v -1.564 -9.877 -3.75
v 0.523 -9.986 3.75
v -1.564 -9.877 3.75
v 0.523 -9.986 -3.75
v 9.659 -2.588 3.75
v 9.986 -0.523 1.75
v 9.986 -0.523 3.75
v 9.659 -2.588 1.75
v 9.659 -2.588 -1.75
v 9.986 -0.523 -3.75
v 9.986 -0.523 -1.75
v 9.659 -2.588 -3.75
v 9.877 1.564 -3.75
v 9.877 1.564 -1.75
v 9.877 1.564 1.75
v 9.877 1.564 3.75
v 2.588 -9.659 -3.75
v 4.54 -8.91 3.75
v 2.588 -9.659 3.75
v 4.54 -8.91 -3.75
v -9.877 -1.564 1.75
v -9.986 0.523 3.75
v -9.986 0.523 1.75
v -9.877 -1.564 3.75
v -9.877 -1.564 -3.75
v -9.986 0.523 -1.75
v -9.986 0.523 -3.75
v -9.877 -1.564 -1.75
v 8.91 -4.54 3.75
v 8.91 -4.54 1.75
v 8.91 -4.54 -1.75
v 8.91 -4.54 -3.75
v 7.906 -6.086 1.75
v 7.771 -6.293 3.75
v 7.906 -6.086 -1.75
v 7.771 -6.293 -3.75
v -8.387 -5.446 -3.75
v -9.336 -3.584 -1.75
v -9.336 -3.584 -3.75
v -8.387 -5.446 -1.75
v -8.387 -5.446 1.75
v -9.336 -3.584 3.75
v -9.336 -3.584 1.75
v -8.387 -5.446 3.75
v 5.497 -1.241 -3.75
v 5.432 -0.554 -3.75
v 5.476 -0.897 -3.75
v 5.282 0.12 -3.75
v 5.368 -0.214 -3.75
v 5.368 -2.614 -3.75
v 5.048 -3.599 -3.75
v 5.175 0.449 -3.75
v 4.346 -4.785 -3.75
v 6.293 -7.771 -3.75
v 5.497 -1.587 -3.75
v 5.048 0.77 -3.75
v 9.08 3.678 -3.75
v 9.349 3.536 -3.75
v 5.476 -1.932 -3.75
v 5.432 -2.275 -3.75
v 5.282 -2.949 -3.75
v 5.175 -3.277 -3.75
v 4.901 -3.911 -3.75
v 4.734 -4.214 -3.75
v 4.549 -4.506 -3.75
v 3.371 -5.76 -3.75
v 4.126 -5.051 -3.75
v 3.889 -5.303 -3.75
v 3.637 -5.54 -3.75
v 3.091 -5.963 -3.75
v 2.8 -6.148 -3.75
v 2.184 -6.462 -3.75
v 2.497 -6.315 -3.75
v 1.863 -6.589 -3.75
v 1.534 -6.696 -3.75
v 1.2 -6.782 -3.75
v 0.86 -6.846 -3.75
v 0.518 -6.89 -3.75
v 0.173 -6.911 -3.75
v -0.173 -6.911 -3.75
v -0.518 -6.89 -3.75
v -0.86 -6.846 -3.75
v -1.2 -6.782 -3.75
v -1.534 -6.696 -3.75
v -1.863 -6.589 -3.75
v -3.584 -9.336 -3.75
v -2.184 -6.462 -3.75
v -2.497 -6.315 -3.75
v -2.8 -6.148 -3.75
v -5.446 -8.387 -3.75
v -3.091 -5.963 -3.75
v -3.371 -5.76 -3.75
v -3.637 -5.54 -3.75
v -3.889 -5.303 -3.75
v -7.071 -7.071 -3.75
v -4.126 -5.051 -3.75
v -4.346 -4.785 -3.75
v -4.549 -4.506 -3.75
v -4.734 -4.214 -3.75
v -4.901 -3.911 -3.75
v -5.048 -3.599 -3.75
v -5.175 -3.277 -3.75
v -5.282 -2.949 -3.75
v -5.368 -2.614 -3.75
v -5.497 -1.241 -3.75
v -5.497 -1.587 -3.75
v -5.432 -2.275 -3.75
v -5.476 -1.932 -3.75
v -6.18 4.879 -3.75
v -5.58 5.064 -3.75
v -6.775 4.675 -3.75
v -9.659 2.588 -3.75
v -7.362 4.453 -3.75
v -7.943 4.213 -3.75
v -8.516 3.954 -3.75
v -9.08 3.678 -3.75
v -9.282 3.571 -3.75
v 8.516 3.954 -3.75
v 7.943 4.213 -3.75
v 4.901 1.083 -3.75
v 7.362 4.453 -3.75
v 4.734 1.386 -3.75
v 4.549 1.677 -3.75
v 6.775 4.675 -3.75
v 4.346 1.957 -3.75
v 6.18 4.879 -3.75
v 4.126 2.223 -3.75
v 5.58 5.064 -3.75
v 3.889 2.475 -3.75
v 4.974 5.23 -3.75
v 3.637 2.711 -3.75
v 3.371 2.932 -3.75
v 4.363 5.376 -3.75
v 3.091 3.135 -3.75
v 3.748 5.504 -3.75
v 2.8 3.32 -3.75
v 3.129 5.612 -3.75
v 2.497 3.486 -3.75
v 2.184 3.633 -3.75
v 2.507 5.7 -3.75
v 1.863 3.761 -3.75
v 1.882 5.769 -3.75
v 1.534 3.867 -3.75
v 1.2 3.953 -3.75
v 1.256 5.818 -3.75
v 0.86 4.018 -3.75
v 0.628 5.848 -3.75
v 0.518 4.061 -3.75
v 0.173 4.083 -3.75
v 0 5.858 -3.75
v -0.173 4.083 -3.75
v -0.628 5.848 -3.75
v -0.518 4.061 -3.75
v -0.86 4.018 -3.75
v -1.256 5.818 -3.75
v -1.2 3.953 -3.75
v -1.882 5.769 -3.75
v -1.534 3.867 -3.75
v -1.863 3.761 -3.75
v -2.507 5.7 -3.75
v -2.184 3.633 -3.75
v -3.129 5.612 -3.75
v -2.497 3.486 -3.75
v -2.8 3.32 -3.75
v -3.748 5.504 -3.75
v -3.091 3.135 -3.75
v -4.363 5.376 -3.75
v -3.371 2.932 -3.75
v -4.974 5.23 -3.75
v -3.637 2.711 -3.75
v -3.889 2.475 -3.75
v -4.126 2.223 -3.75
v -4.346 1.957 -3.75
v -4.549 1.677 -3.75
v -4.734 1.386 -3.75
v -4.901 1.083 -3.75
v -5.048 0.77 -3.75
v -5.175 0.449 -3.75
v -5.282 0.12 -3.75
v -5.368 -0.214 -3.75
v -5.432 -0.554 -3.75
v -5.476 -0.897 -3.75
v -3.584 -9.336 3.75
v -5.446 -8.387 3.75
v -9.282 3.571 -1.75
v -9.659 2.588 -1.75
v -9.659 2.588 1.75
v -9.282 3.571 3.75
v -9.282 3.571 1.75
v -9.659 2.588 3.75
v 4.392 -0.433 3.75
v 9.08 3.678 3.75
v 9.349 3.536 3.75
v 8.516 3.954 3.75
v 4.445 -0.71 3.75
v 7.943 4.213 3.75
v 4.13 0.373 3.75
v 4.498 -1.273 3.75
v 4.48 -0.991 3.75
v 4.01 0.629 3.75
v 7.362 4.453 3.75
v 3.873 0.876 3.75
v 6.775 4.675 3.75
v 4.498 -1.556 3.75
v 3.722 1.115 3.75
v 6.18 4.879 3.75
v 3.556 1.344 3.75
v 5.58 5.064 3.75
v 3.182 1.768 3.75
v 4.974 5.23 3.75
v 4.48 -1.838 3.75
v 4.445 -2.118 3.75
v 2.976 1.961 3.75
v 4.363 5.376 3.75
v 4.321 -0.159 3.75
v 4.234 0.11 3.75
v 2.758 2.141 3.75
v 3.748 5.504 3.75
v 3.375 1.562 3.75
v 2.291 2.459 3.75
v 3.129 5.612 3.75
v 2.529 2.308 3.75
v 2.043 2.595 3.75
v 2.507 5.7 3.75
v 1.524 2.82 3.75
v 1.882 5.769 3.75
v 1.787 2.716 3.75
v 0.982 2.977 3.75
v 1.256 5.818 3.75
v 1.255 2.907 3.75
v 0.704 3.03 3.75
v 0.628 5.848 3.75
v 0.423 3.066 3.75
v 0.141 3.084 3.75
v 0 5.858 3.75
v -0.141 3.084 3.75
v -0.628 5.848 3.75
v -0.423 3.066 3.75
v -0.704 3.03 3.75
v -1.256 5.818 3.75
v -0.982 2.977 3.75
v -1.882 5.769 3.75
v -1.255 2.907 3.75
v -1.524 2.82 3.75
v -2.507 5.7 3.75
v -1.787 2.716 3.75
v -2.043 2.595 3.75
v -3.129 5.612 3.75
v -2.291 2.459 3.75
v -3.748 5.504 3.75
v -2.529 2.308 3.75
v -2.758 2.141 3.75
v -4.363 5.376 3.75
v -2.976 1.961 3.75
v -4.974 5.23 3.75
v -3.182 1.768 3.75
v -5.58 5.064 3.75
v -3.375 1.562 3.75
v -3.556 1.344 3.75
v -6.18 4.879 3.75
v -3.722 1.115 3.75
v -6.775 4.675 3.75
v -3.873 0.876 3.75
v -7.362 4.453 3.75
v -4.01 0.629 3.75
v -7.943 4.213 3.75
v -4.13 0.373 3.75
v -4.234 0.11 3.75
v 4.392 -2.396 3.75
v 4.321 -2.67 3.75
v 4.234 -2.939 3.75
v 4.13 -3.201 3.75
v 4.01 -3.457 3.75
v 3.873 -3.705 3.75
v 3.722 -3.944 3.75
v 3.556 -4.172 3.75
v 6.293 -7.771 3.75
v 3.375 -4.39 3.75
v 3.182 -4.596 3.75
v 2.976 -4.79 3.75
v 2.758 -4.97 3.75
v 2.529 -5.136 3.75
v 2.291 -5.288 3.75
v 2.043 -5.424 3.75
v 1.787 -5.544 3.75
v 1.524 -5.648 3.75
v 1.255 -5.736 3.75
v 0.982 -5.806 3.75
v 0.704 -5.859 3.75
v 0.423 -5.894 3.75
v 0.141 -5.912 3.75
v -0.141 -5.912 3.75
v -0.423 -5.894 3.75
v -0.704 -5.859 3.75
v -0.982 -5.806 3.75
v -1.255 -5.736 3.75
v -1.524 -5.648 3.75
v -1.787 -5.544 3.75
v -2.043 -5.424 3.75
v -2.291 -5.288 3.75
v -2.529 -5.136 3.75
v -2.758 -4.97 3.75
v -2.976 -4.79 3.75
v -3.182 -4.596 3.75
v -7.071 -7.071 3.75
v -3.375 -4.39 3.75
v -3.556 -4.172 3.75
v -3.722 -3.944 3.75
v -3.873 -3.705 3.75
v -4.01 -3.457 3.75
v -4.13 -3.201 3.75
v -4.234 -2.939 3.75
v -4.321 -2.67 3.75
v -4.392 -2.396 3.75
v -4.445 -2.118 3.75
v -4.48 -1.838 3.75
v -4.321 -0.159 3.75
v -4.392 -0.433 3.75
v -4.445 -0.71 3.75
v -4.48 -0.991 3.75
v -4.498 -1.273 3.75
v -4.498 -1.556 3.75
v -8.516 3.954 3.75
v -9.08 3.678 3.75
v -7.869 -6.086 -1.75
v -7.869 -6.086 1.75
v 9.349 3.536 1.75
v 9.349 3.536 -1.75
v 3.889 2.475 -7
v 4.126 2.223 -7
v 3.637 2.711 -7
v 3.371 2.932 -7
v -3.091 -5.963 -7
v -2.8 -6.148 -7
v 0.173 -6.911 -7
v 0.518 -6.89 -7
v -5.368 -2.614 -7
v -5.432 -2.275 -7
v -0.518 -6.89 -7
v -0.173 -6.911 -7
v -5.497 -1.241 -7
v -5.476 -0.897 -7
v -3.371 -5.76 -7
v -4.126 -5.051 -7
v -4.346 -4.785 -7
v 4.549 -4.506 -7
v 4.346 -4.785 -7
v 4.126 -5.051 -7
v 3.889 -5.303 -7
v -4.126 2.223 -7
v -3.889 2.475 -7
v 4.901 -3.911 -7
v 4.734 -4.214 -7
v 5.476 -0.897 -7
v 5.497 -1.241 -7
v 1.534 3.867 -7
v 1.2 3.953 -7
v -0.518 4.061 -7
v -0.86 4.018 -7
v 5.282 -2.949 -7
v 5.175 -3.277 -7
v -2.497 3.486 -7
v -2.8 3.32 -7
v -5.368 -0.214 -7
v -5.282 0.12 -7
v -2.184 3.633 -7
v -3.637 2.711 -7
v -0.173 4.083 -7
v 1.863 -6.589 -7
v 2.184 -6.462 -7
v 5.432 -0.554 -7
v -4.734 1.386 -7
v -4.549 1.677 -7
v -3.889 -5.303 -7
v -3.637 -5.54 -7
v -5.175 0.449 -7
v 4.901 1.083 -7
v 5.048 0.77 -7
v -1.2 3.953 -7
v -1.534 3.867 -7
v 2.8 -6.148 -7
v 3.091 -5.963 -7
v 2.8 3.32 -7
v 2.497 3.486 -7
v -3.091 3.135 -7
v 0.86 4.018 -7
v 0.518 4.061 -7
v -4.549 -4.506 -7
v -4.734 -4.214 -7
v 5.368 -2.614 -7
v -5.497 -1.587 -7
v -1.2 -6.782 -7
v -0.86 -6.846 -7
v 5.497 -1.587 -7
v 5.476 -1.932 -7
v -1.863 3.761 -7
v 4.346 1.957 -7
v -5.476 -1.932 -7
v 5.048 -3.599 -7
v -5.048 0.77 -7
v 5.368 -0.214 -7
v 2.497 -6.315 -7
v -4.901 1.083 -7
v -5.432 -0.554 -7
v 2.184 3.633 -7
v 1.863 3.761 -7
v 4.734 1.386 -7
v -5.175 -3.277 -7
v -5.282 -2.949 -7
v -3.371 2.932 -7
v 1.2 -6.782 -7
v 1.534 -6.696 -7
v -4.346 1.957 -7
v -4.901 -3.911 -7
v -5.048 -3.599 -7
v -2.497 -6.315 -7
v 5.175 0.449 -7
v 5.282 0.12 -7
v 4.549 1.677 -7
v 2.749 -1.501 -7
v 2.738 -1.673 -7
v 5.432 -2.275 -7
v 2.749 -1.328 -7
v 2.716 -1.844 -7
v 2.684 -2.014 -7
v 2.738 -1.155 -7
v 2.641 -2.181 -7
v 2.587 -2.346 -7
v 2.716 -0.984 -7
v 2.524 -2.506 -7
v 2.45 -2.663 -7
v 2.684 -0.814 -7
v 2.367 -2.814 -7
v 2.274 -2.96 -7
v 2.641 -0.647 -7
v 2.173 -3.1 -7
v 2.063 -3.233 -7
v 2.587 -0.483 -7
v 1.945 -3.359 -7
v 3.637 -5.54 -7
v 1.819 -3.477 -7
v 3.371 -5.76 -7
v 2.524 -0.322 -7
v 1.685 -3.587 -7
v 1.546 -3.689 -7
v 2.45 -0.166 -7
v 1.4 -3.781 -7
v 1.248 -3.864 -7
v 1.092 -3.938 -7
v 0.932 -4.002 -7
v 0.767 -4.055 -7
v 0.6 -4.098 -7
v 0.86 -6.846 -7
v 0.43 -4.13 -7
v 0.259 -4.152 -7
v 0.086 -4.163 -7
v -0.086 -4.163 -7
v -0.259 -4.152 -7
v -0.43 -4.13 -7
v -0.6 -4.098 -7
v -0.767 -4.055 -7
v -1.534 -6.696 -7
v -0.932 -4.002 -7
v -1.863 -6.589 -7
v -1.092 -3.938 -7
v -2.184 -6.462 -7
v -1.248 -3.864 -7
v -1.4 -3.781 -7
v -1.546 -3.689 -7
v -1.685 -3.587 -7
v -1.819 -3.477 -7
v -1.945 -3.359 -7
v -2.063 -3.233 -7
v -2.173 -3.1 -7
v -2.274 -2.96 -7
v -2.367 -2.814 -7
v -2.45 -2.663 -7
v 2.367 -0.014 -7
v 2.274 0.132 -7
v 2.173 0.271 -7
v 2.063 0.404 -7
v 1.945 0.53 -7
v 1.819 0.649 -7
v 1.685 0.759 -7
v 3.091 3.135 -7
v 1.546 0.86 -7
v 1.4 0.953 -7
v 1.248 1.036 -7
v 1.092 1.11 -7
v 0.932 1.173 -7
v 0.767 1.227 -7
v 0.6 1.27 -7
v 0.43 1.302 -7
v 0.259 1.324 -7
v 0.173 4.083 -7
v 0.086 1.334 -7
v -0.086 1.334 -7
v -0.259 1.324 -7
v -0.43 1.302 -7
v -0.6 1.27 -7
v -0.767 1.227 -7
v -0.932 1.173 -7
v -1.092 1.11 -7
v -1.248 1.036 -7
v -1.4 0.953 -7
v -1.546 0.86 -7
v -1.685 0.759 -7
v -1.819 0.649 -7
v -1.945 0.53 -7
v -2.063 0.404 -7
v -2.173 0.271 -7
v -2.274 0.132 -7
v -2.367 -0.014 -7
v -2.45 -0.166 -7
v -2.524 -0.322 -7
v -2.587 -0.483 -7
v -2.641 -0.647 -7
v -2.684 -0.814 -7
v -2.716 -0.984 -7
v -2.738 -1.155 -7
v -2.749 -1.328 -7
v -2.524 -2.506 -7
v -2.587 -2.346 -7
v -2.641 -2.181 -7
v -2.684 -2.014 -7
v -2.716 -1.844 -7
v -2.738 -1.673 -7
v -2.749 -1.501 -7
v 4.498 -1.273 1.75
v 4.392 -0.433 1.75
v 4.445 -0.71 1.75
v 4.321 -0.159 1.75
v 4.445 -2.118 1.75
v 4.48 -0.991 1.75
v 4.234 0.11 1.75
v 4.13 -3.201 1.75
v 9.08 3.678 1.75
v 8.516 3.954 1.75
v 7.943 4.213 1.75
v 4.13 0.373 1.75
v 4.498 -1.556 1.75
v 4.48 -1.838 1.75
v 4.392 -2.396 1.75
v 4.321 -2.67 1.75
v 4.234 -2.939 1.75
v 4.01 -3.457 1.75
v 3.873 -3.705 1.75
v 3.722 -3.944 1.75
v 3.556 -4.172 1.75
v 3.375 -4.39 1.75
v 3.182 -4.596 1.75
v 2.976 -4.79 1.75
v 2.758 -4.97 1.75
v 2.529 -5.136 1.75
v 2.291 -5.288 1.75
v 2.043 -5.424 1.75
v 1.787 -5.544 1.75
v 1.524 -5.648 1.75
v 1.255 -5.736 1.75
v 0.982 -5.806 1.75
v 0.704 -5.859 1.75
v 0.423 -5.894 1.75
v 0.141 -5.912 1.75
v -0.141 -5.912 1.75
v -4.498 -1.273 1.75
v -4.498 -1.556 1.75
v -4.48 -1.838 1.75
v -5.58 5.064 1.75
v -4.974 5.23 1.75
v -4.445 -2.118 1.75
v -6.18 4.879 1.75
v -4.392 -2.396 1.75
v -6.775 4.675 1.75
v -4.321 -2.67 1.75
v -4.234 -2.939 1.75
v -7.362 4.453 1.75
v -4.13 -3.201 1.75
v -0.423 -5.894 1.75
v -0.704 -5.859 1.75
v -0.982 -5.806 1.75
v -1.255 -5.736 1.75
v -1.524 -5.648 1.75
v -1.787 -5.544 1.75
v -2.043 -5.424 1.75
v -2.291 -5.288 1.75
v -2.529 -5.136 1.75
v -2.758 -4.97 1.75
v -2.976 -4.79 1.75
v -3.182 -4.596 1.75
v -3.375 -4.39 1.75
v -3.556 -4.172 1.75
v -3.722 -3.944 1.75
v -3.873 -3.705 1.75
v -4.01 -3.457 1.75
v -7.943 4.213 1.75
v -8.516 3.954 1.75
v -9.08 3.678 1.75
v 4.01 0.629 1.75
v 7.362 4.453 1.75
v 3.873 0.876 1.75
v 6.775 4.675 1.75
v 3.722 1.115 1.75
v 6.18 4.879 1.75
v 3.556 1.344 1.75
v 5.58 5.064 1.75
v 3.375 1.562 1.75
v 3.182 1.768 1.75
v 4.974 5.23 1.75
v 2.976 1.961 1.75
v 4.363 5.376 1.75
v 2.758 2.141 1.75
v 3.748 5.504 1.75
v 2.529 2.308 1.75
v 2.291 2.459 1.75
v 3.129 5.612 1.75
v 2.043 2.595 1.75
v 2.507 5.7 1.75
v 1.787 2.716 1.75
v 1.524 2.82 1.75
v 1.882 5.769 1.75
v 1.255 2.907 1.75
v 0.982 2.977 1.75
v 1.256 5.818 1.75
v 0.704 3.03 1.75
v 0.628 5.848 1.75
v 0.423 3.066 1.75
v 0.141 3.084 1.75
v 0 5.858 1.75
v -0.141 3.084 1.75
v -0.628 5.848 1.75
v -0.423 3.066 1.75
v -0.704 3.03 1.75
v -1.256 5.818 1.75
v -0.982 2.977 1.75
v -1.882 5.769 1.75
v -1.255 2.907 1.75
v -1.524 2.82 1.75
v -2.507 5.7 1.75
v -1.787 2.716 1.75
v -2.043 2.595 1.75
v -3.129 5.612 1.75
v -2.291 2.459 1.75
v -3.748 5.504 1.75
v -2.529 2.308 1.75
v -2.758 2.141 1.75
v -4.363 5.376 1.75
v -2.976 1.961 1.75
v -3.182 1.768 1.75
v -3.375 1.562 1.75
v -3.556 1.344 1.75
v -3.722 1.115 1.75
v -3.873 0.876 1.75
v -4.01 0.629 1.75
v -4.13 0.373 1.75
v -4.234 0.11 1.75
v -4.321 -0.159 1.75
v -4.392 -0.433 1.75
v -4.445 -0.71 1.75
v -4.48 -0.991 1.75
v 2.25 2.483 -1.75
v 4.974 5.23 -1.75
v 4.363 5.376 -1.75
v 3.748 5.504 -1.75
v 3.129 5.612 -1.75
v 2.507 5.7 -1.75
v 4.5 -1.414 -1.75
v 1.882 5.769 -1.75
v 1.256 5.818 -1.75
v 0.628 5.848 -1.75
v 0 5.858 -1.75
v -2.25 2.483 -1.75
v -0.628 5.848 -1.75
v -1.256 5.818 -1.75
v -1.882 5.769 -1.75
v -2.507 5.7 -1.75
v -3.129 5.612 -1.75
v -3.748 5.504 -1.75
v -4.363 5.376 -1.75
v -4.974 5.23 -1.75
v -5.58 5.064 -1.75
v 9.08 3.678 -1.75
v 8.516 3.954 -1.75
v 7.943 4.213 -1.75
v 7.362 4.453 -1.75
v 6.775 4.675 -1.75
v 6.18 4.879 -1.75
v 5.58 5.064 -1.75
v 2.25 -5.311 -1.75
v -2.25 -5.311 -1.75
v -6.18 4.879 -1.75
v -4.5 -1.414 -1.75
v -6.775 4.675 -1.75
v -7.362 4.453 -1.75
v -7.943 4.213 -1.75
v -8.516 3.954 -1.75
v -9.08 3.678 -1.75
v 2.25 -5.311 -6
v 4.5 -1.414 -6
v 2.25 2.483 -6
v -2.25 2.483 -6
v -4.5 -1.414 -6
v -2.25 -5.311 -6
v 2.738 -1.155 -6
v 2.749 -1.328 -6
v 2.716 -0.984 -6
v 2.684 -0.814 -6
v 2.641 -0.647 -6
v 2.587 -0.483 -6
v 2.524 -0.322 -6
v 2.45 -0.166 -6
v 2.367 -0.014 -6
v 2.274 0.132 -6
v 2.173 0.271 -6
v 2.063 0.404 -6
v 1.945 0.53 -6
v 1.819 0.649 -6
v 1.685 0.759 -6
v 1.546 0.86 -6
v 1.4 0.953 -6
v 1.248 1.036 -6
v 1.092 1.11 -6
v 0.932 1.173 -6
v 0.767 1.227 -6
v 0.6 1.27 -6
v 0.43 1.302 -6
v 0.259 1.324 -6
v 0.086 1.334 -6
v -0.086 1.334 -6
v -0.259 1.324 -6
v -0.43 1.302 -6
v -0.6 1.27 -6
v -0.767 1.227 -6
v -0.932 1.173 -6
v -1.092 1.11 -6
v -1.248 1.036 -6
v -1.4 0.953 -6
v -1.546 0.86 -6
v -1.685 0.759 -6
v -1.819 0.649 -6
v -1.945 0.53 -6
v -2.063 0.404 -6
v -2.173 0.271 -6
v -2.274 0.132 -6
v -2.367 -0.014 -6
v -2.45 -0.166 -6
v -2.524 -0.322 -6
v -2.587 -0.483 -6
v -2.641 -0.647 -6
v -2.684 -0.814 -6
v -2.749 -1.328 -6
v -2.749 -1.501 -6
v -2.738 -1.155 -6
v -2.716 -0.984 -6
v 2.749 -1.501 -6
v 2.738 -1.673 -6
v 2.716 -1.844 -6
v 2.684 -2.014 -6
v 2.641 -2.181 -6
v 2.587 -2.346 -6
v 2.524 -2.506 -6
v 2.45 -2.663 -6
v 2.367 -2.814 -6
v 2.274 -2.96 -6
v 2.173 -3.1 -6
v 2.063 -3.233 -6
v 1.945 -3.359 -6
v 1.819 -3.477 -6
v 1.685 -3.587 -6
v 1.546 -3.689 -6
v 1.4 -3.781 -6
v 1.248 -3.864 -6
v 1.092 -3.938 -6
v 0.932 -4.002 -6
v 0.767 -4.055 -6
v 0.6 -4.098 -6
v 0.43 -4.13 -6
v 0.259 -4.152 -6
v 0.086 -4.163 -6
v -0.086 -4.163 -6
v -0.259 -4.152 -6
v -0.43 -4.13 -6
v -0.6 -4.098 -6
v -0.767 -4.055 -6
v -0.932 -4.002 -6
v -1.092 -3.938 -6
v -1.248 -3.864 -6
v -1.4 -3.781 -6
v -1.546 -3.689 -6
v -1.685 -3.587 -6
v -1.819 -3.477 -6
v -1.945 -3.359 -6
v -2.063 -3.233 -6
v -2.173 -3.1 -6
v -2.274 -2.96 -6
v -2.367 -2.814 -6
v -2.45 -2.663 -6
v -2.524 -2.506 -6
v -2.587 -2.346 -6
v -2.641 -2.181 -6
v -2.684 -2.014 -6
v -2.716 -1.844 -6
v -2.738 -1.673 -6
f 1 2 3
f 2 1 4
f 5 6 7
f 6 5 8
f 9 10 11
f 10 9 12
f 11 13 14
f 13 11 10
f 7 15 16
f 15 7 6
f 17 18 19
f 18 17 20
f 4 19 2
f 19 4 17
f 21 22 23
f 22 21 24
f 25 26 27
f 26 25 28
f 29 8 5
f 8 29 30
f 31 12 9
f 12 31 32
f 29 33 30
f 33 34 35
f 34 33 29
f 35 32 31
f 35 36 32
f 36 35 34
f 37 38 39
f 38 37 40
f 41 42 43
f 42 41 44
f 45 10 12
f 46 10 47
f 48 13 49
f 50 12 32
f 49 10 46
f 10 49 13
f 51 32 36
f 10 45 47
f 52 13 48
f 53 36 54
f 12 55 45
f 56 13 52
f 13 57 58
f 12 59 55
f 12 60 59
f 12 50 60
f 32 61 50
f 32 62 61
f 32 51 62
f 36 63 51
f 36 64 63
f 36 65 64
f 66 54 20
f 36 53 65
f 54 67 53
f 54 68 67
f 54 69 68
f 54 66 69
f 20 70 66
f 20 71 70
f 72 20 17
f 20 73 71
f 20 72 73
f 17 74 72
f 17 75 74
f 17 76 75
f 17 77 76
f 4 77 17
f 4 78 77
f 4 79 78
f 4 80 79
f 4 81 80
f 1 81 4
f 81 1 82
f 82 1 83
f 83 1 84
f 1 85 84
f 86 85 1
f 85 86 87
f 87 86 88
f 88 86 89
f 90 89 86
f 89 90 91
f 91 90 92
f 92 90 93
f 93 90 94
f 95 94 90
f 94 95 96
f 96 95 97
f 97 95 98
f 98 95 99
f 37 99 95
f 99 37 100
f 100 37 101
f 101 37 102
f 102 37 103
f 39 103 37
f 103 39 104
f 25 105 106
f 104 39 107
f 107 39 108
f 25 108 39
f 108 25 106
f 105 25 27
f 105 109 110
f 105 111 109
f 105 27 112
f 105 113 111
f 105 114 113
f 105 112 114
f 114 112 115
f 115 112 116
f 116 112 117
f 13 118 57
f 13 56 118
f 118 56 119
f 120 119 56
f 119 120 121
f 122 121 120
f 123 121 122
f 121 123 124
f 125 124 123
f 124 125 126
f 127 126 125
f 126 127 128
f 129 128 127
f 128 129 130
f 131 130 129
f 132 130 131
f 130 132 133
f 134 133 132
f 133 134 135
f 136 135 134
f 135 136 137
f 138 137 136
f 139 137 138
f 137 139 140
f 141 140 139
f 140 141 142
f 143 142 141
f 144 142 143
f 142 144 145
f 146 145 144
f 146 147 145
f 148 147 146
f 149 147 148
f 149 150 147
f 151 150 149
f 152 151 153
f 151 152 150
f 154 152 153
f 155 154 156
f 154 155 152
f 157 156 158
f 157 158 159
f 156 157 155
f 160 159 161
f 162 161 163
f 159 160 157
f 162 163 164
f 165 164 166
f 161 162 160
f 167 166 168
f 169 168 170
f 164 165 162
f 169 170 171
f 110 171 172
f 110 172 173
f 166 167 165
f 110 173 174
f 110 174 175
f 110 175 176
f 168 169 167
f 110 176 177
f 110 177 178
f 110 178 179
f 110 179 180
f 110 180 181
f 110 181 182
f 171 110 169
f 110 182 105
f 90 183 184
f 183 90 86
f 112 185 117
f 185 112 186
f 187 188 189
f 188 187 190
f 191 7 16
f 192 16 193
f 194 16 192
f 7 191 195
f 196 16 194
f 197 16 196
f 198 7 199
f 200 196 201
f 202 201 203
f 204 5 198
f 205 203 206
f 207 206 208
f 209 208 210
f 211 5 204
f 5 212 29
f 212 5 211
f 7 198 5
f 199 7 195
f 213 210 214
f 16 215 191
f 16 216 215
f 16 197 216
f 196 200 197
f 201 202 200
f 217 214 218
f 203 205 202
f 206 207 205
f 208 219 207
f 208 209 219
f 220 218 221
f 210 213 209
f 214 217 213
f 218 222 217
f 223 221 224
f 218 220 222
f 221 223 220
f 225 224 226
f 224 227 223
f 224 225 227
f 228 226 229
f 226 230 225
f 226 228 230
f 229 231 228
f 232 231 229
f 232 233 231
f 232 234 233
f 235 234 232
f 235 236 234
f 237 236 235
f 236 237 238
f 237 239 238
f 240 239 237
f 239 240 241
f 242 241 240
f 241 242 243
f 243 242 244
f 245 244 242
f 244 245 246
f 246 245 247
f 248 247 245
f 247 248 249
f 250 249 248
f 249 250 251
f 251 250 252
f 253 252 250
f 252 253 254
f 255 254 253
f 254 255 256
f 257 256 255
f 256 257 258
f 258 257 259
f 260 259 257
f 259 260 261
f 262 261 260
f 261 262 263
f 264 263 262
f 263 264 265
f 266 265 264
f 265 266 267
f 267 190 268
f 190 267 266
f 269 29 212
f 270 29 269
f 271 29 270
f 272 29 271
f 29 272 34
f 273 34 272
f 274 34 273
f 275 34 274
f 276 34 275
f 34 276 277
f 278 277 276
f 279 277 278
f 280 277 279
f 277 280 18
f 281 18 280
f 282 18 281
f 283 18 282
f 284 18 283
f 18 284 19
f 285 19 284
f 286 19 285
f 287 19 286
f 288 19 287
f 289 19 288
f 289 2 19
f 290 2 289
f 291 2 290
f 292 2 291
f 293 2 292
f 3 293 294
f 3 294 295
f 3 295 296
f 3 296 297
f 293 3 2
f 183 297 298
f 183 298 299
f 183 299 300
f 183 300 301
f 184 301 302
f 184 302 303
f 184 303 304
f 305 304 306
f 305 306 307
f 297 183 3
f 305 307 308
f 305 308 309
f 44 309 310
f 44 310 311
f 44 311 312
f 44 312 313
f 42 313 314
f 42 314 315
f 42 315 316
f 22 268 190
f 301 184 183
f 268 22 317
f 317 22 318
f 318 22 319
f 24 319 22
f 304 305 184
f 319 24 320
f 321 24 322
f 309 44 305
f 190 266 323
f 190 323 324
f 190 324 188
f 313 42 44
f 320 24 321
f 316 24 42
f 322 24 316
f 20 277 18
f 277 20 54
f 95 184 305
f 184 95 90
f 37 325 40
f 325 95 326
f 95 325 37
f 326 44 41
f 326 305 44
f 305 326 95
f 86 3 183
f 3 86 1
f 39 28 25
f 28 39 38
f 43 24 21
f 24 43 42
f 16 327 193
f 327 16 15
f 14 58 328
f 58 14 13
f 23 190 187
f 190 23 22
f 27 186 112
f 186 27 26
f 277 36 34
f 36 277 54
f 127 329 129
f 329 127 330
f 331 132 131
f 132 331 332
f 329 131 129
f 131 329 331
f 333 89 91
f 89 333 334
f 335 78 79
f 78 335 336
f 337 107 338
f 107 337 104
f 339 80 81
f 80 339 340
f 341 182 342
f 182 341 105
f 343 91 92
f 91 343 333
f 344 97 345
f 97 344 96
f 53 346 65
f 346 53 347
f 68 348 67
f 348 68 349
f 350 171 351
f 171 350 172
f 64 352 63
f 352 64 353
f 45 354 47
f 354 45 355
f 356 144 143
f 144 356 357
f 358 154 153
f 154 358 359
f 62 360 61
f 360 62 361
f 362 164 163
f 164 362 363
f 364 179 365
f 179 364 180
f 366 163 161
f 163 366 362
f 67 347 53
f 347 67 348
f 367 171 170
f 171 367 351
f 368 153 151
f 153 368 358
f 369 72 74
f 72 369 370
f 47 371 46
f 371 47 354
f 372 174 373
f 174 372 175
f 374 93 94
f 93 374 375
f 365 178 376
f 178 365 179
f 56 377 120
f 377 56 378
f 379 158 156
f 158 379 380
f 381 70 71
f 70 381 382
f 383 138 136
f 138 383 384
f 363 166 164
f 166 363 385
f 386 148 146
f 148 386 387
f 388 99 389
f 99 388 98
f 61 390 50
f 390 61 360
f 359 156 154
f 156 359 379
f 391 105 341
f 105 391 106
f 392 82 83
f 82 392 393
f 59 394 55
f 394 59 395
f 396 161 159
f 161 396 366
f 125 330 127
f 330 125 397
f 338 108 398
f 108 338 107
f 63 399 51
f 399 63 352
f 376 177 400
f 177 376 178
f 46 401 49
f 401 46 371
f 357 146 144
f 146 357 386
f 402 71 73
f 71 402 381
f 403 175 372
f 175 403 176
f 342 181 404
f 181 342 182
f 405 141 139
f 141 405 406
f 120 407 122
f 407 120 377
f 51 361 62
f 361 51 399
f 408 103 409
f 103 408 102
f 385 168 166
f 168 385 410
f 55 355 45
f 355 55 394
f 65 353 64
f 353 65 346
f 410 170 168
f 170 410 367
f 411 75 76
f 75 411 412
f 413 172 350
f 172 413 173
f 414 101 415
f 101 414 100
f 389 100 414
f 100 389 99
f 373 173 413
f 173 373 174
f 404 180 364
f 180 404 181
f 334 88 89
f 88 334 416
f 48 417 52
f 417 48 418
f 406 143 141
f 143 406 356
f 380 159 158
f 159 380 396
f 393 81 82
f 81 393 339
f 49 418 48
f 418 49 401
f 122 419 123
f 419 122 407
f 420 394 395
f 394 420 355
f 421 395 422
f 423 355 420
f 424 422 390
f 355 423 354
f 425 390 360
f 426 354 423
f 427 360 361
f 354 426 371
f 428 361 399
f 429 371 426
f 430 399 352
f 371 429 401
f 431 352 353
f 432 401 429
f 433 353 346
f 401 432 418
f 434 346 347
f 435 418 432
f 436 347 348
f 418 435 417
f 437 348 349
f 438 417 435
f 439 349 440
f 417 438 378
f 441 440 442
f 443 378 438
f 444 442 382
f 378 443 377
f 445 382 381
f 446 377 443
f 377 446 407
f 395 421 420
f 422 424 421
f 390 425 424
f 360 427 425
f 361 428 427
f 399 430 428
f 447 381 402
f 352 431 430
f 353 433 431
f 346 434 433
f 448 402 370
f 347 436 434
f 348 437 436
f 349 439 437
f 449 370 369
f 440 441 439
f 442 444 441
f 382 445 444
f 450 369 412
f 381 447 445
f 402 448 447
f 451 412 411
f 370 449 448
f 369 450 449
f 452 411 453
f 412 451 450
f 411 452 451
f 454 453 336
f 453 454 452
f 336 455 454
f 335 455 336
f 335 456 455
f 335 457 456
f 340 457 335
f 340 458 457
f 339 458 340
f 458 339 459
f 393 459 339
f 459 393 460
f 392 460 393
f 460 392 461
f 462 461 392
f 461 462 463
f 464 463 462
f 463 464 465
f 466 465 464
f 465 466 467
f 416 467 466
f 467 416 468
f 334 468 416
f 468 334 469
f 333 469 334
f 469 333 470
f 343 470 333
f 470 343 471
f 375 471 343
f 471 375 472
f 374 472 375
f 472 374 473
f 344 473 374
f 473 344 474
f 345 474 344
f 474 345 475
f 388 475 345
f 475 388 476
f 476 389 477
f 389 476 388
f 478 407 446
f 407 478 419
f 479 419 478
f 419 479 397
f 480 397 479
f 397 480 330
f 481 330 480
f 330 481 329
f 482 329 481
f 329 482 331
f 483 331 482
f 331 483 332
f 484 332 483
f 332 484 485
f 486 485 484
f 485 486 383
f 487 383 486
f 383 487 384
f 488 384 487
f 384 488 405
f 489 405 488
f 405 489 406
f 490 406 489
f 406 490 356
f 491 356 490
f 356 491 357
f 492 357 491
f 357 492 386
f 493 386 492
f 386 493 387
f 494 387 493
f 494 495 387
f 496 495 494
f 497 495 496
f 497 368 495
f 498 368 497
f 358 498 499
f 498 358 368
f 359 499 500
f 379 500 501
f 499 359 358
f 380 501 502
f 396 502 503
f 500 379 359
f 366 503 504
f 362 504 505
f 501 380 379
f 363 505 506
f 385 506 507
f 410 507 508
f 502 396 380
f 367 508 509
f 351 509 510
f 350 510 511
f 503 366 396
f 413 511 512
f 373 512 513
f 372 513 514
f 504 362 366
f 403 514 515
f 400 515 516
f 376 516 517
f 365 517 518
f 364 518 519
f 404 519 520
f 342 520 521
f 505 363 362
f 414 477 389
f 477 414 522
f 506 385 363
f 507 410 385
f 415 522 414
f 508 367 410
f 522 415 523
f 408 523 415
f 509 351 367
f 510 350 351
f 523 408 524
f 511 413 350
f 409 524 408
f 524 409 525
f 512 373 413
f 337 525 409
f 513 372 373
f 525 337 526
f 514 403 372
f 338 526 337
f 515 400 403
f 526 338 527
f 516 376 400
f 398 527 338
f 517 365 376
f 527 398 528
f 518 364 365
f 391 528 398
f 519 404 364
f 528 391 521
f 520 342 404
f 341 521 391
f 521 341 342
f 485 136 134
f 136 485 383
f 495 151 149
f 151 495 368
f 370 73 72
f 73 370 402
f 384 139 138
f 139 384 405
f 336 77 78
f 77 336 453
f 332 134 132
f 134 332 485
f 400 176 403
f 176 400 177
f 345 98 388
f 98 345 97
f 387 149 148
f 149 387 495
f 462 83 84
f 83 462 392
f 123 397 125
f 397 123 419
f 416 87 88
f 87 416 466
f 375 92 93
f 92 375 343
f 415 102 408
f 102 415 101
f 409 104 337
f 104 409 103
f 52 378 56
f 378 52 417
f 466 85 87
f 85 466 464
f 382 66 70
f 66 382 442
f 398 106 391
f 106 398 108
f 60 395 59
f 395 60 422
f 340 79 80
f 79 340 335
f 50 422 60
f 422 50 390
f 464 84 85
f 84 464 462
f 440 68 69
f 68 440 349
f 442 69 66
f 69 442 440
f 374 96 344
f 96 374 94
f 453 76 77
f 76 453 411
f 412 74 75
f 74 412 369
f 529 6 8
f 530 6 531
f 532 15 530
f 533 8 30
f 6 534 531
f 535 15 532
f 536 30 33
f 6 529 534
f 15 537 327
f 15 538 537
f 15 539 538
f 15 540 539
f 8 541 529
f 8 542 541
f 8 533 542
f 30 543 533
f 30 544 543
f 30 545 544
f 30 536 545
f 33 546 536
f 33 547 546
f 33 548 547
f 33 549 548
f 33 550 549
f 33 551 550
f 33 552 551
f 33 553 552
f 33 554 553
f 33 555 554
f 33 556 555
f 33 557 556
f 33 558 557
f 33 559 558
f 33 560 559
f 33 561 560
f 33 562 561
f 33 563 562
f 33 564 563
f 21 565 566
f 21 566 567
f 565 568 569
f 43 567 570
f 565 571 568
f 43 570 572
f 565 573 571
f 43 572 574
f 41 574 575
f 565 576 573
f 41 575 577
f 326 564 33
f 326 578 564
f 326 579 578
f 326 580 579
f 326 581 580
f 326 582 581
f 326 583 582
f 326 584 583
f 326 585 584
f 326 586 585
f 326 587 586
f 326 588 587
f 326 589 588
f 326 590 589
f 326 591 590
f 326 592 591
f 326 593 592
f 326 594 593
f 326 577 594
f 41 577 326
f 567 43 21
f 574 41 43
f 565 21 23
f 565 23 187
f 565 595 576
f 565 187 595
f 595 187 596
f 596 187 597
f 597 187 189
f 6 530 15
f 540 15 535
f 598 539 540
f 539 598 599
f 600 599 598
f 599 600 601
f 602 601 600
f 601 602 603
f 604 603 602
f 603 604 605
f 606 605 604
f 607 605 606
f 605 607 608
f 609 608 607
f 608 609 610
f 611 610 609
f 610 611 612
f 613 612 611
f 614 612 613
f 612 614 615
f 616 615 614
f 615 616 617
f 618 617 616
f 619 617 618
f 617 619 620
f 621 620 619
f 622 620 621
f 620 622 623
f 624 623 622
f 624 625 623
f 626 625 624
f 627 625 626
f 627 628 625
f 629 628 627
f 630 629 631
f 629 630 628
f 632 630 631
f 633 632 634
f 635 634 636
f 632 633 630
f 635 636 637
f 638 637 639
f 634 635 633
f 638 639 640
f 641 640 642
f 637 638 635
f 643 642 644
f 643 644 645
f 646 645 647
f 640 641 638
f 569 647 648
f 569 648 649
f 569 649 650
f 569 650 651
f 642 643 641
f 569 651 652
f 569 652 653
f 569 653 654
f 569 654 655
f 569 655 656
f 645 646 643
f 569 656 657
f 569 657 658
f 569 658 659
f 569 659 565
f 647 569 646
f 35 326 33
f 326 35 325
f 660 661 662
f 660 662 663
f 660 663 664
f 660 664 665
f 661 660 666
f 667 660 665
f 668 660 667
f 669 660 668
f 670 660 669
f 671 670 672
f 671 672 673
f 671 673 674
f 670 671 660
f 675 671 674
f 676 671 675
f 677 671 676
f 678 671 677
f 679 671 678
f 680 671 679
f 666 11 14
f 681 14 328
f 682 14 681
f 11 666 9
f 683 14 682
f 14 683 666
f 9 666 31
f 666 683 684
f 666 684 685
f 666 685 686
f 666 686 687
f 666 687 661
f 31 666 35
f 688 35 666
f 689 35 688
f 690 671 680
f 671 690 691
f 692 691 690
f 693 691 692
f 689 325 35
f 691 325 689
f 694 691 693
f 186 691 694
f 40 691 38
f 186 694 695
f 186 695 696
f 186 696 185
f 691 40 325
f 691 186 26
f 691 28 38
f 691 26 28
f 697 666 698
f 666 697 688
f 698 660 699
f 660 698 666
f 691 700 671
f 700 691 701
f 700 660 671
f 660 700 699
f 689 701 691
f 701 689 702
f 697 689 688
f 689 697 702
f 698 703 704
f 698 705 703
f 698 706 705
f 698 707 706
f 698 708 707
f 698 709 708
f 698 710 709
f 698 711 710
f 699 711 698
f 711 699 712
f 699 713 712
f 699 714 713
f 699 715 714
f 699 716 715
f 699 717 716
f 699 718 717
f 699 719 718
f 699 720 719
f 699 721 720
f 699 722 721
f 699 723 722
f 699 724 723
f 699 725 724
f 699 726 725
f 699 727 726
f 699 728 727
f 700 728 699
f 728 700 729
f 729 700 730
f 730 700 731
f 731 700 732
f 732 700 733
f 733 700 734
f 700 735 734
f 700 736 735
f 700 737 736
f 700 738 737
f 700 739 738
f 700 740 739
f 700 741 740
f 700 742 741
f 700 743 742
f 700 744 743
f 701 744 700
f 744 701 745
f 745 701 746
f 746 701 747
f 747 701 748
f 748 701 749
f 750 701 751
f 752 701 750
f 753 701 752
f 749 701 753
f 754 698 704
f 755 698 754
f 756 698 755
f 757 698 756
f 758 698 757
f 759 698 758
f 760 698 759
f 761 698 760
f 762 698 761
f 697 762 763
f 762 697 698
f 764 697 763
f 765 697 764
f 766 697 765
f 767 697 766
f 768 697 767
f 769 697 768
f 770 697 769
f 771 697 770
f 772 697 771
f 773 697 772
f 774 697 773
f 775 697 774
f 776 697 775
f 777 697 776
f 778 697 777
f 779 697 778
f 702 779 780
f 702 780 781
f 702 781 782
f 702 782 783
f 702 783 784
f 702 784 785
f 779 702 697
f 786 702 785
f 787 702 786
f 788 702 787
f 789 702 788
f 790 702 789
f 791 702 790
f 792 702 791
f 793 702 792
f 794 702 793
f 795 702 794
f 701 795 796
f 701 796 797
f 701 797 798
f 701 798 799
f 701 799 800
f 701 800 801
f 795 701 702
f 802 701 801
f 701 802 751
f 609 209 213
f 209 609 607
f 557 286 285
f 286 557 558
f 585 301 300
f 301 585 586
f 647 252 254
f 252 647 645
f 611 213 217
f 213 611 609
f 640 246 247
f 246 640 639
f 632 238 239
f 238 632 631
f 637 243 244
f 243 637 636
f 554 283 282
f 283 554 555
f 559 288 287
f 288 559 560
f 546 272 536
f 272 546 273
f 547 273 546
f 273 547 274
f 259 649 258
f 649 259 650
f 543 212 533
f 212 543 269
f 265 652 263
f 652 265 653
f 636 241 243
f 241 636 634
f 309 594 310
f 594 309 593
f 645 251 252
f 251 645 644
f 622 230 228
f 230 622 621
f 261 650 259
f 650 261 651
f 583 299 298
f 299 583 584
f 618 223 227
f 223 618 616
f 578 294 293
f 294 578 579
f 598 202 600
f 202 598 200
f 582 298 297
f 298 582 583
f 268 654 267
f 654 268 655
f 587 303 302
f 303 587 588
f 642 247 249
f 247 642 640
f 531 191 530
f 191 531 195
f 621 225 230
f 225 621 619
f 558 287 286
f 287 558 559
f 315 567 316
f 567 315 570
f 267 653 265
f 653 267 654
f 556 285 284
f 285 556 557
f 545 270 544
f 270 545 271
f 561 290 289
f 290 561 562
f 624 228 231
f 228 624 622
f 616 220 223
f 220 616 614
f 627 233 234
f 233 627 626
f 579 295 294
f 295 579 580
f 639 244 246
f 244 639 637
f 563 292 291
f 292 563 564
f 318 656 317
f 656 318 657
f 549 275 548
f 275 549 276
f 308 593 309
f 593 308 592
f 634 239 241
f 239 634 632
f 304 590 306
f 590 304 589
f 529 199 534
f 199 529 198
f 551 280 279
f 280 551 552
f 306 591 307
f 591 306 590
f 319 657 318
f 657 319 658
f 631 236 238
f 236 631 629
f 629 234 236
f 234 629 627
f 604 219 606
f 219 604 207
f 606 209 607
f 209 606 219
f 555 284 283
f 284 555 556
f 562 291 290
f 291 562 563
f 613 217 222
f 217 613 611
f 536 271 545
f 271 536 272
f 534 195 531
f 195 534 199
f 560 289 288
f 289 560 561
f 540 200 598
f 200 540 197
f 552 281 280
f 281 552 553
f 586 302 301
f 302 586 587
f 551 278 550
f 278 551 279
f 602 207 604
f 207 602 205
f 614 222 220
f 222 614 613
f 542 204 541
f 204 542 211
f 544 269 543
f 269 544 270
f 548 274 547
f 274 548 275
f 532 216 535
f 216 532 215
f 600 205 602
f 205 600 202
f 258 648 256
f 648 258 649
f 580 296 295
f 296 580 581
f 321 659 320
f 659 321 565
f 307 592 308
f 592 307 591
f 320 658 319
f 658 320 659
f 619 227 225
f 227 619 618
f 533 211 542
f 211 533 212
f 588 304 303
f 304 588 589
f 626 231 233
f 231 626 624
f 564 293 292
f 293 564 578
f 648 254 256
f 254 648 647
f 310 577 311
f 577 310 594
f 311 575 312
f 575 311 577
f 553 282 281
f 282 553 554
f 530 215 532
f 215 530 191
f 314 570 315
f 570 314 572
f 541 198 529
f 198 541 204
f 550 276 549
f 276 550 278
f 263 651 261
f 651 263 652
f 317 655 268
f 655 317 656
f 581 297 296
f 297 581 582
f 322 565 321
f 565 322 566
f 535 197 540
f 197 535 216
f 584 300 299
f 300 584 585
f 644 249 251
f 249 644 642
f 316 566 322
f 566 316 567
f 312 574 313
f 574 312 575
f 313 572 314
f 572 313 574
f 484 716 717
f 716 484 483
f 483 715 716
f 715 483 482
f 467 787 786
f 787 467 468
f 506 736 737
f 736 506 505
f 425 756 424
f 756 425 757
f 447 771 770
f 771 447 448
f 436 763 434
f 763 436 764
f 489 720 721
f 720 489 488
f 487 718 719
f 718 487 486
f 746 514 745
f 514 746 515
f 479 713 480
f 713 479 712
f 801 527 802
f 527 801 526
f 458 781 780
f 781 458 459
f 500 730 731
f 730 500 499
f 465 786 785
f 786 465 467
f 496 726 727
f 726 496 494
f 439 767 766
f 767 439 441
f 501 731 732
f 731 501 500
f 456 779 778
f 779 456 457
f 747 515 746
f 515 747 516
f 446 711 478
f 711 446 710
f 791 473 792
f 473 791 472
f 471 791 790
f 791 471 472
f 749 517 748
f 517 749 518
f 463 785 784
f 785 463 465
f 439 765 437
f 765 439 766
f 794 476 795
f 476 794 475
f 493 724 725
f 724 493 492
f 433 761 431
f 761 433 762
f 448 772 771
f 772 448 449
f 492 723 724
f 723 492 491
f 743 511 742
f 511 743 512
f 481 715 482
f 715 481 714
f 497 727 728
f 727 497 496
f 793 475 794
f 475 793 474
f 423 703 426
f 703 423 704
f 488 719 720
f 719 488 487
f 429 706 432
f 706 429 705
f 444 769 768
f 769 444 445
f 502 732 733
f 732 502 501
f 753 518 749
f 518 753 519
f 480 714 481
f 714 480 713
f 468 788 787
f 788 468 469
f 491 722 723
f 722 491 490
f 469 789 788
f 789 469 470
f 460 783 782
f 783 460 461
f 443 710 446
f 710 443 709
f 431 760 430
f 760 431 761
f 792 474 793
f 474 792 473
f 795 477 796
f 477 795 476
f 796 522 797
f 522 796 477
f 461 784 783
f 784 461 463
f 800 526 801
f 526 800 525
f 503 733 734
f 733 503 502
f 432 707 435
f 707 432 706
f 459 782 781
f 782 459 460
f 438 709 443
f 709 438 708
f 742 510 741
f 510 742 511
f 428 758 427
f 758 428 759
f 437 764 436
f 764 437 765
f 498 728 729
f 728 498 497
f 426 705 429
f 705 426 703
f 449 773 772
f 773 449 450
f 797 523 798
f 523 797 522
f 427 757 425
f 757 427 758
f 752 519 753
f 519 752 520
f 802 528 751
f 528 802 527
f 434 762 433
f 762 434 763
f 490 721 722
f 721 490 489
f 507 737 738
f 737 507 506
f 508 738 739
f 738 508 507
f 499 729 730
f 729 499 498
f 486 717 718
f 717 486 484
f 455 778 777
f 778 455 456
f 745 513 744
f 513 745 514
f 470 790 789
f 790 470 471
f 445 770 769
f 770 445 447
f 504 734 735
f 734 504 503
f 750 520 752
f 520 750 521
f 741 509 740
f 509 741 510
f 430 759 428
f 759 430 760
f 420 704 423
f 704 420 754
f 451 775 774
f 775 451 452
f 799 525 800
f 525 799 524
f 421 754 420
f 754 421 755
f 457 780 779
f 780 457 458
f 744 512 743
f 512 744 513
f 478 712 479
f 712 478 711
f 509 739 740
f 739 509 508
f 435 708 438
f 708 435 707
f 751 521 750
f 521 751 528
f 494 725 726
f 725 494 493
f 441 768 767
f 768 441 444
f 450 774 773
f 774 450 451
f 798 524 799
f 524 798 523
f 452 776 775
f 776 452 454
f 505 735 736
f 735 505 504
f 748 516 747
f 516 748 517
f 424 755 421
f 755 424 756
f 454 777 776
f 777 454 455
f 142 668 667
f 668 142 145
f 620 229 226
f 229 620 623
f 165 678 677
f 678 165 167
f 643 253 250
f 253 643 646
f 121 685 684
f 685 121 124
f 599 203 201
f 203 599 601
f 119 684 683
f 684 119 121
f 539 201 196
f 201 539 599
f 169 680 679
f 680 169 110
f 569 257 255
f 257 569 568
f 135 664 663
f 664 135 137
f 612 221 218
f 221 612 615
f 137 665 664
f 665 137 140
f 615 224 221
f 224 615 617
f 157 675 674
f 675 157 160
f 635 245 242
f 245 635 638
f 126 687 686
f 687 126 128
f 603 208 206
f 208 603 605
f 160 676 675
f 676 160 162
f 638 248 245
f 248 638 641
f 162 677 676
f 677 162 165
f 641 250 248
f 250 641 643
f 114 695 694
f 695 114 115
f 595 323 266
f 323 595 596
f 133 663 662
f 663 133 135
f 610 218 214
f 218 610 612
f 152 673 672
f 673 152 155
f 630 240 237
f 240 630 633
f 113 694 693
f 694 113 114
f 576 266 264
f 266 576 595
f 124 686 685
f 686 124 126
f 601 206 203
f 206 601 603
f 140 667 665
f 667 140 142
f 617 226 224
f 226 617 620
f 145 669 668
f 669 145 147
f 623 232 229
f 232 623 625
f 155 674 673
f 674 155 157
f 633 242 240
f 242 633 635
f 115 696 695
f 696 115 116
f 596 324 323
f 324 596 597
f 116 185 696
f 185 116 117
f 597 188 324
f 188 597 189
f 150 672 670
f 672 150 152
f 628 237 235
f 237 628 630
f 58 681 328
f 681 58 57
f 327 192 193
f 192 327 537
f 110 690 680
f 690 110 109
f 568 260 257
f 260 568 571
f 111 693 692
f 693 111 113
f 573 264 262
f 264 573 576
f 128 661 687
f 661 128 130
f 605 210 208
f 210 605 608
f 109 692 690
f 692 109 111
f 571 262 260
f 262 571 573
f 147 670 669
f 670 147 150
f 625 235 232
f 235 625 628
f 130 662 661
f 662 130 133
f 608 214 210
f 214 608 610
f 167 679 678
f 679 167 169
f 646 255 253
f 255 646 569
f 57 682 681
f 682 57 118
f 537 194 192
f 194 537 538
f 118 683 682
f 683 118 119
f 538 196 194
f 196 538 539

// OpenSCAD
// file: vars.scad
/* Makefile needs */
PART = "none";
IMAGE = "none";

/* frame */
height = 690;
width = 500;
depth = 500;

frame_size = 20;
frame_half = frame_size / 2;

glass_height = 3;
glass_width = 400;
glass_depth = 400;

rail_diam = 10;
z_rail_width = 60;
z_carriage_width = z_rail_width + frame_size;

// Sources for Metric fastener dimensions
// http://www.carbidedepot.com/formulas-tap-metric.htm
// http://www.roymech.co.uk/Useful_Tables/Screws/cap_screws.htm
// https://www.fairburyfastener.com/xdims_metric_nuts.htm

// M5
M5_bolt_diam = 5;
M5_bolt_hole = 5.5;
M5_nut_height = 4;
M5_nut_width = 7.9;
M5_nut_diam = 9;

// M4
M4_bolt_diam = 4;
M4_bolt_hole = 4.5;
M4_nut_height = 3.5;
M4_nut_width = 6.9;
M4_nut_diam = 8;


//608zz
608zz_height=7;
608zz_od=22;
608zz_id=8;
608zz_race=11;



// Height adjustment
pivot_diam=12;
height_bolt_diam=M4_bolt_diam;
// main file
/*
 *
 * Copyright 2019 Tim Schaller
 * All rights reserved
 * Released under the GPL3
 * No claims are made as to the fitness and/or corectness of
 * this work. Use at your own risk. If you create useless things,
 * or if the parts fail it is on you NOT ME. As far as I know
 * this might make your printer burst into flames or print
 * little pink bunnies. You call. };->
 *
 */

 /* ========================================================= */
 /* MODULES                                                   */
 /* ========================================================= */

include <vars.scad>;

PART = "glass_holder_side";

if (PART == "glass_holder_side") {
    rotate([0, 0, 45])
    glass_holder_side();
}

if (PART == "glass_holder_side_round") {
    rotate([0, 0, 45])
    glass_holder_side(fn=360);
}

if (PART == "glass_holder_corner") {
    glass_holder_corner();
}



module glass_holder_side(
  height=3.5,
  length=20,
  bolt_head_diam=9,
  bolt_hole_diam=5.5,
  fn=6,
) {

  x_off=-(1);
  y_off=-(1);

  intersection() {
    difference() {
      union() {
        cylinder(h=height+4, d=length, center=true);
        translate([x_off, y_off, -height])
            cylinder(h=7, d=bolt_head_diam+2, $fn=100, center=true);
      }
      translate([1,1,0]) rotate([0,0,45]) cube([length-5, length, height], center=true);

      translate([x_off, y_off, -(height-1)]) rotate([0, 0, 15])
          cylinder(h=7, d=bolt_head_diam, $fn=fn, center=true);
      translate([x_off, y_off, height-1])
          cylinder(h=3, d=bolt_head_diam, $fn=100, center=true);

      translate([x_off, y_off, height-1])
          cylinder(h=30, d=bolt_hole_diam, $fn=100, center=true);
    }
    translate([-length/2, -length/2, 0])
        cylinder(h=30, d=length*2, $fn=200, center=true);
  }
}


module glass_holder_corner(
  height=3.5,
  length=20,
  bolt_head_diam=9,
  bolt_hole_diam=5.5
) {
  intersection() {
    difference() {
      union() {
        cube([length, length, height+2], center=true);
        translate([-(bolt_head_diam/2), -(bolt_head_diam/2), -height])
            cylinder(h=7, d=bolt_head_diam+2, $fn=100, center=true);
      }
      translate([1,1,0]) cube([length, length, height], center=true);

      translate([-(bolt_head_diam/2), -(bolt_head_diam/2), -(height-1)])
          cylinder(h=7, d=bolt_head_diam, $fn=6, center=true);
      translate([-(bolt_head_diam/2), -(bolt_head_diam/2), height-1])
          cylinder(h=3, d=bolt_head_diam, $fn=100, center=true);

      translate([-(bolt_head_diam/2), -(bolt_head_diam/2), height-1])
          cylinder(h=30, d=bolt_hole_diam, $fn=100, center=true);
    }
    translate([-(length/2), -(length/2), 0])
        cylinder(h=30, d=length*2, $fn=200, center=true);
  }
}
